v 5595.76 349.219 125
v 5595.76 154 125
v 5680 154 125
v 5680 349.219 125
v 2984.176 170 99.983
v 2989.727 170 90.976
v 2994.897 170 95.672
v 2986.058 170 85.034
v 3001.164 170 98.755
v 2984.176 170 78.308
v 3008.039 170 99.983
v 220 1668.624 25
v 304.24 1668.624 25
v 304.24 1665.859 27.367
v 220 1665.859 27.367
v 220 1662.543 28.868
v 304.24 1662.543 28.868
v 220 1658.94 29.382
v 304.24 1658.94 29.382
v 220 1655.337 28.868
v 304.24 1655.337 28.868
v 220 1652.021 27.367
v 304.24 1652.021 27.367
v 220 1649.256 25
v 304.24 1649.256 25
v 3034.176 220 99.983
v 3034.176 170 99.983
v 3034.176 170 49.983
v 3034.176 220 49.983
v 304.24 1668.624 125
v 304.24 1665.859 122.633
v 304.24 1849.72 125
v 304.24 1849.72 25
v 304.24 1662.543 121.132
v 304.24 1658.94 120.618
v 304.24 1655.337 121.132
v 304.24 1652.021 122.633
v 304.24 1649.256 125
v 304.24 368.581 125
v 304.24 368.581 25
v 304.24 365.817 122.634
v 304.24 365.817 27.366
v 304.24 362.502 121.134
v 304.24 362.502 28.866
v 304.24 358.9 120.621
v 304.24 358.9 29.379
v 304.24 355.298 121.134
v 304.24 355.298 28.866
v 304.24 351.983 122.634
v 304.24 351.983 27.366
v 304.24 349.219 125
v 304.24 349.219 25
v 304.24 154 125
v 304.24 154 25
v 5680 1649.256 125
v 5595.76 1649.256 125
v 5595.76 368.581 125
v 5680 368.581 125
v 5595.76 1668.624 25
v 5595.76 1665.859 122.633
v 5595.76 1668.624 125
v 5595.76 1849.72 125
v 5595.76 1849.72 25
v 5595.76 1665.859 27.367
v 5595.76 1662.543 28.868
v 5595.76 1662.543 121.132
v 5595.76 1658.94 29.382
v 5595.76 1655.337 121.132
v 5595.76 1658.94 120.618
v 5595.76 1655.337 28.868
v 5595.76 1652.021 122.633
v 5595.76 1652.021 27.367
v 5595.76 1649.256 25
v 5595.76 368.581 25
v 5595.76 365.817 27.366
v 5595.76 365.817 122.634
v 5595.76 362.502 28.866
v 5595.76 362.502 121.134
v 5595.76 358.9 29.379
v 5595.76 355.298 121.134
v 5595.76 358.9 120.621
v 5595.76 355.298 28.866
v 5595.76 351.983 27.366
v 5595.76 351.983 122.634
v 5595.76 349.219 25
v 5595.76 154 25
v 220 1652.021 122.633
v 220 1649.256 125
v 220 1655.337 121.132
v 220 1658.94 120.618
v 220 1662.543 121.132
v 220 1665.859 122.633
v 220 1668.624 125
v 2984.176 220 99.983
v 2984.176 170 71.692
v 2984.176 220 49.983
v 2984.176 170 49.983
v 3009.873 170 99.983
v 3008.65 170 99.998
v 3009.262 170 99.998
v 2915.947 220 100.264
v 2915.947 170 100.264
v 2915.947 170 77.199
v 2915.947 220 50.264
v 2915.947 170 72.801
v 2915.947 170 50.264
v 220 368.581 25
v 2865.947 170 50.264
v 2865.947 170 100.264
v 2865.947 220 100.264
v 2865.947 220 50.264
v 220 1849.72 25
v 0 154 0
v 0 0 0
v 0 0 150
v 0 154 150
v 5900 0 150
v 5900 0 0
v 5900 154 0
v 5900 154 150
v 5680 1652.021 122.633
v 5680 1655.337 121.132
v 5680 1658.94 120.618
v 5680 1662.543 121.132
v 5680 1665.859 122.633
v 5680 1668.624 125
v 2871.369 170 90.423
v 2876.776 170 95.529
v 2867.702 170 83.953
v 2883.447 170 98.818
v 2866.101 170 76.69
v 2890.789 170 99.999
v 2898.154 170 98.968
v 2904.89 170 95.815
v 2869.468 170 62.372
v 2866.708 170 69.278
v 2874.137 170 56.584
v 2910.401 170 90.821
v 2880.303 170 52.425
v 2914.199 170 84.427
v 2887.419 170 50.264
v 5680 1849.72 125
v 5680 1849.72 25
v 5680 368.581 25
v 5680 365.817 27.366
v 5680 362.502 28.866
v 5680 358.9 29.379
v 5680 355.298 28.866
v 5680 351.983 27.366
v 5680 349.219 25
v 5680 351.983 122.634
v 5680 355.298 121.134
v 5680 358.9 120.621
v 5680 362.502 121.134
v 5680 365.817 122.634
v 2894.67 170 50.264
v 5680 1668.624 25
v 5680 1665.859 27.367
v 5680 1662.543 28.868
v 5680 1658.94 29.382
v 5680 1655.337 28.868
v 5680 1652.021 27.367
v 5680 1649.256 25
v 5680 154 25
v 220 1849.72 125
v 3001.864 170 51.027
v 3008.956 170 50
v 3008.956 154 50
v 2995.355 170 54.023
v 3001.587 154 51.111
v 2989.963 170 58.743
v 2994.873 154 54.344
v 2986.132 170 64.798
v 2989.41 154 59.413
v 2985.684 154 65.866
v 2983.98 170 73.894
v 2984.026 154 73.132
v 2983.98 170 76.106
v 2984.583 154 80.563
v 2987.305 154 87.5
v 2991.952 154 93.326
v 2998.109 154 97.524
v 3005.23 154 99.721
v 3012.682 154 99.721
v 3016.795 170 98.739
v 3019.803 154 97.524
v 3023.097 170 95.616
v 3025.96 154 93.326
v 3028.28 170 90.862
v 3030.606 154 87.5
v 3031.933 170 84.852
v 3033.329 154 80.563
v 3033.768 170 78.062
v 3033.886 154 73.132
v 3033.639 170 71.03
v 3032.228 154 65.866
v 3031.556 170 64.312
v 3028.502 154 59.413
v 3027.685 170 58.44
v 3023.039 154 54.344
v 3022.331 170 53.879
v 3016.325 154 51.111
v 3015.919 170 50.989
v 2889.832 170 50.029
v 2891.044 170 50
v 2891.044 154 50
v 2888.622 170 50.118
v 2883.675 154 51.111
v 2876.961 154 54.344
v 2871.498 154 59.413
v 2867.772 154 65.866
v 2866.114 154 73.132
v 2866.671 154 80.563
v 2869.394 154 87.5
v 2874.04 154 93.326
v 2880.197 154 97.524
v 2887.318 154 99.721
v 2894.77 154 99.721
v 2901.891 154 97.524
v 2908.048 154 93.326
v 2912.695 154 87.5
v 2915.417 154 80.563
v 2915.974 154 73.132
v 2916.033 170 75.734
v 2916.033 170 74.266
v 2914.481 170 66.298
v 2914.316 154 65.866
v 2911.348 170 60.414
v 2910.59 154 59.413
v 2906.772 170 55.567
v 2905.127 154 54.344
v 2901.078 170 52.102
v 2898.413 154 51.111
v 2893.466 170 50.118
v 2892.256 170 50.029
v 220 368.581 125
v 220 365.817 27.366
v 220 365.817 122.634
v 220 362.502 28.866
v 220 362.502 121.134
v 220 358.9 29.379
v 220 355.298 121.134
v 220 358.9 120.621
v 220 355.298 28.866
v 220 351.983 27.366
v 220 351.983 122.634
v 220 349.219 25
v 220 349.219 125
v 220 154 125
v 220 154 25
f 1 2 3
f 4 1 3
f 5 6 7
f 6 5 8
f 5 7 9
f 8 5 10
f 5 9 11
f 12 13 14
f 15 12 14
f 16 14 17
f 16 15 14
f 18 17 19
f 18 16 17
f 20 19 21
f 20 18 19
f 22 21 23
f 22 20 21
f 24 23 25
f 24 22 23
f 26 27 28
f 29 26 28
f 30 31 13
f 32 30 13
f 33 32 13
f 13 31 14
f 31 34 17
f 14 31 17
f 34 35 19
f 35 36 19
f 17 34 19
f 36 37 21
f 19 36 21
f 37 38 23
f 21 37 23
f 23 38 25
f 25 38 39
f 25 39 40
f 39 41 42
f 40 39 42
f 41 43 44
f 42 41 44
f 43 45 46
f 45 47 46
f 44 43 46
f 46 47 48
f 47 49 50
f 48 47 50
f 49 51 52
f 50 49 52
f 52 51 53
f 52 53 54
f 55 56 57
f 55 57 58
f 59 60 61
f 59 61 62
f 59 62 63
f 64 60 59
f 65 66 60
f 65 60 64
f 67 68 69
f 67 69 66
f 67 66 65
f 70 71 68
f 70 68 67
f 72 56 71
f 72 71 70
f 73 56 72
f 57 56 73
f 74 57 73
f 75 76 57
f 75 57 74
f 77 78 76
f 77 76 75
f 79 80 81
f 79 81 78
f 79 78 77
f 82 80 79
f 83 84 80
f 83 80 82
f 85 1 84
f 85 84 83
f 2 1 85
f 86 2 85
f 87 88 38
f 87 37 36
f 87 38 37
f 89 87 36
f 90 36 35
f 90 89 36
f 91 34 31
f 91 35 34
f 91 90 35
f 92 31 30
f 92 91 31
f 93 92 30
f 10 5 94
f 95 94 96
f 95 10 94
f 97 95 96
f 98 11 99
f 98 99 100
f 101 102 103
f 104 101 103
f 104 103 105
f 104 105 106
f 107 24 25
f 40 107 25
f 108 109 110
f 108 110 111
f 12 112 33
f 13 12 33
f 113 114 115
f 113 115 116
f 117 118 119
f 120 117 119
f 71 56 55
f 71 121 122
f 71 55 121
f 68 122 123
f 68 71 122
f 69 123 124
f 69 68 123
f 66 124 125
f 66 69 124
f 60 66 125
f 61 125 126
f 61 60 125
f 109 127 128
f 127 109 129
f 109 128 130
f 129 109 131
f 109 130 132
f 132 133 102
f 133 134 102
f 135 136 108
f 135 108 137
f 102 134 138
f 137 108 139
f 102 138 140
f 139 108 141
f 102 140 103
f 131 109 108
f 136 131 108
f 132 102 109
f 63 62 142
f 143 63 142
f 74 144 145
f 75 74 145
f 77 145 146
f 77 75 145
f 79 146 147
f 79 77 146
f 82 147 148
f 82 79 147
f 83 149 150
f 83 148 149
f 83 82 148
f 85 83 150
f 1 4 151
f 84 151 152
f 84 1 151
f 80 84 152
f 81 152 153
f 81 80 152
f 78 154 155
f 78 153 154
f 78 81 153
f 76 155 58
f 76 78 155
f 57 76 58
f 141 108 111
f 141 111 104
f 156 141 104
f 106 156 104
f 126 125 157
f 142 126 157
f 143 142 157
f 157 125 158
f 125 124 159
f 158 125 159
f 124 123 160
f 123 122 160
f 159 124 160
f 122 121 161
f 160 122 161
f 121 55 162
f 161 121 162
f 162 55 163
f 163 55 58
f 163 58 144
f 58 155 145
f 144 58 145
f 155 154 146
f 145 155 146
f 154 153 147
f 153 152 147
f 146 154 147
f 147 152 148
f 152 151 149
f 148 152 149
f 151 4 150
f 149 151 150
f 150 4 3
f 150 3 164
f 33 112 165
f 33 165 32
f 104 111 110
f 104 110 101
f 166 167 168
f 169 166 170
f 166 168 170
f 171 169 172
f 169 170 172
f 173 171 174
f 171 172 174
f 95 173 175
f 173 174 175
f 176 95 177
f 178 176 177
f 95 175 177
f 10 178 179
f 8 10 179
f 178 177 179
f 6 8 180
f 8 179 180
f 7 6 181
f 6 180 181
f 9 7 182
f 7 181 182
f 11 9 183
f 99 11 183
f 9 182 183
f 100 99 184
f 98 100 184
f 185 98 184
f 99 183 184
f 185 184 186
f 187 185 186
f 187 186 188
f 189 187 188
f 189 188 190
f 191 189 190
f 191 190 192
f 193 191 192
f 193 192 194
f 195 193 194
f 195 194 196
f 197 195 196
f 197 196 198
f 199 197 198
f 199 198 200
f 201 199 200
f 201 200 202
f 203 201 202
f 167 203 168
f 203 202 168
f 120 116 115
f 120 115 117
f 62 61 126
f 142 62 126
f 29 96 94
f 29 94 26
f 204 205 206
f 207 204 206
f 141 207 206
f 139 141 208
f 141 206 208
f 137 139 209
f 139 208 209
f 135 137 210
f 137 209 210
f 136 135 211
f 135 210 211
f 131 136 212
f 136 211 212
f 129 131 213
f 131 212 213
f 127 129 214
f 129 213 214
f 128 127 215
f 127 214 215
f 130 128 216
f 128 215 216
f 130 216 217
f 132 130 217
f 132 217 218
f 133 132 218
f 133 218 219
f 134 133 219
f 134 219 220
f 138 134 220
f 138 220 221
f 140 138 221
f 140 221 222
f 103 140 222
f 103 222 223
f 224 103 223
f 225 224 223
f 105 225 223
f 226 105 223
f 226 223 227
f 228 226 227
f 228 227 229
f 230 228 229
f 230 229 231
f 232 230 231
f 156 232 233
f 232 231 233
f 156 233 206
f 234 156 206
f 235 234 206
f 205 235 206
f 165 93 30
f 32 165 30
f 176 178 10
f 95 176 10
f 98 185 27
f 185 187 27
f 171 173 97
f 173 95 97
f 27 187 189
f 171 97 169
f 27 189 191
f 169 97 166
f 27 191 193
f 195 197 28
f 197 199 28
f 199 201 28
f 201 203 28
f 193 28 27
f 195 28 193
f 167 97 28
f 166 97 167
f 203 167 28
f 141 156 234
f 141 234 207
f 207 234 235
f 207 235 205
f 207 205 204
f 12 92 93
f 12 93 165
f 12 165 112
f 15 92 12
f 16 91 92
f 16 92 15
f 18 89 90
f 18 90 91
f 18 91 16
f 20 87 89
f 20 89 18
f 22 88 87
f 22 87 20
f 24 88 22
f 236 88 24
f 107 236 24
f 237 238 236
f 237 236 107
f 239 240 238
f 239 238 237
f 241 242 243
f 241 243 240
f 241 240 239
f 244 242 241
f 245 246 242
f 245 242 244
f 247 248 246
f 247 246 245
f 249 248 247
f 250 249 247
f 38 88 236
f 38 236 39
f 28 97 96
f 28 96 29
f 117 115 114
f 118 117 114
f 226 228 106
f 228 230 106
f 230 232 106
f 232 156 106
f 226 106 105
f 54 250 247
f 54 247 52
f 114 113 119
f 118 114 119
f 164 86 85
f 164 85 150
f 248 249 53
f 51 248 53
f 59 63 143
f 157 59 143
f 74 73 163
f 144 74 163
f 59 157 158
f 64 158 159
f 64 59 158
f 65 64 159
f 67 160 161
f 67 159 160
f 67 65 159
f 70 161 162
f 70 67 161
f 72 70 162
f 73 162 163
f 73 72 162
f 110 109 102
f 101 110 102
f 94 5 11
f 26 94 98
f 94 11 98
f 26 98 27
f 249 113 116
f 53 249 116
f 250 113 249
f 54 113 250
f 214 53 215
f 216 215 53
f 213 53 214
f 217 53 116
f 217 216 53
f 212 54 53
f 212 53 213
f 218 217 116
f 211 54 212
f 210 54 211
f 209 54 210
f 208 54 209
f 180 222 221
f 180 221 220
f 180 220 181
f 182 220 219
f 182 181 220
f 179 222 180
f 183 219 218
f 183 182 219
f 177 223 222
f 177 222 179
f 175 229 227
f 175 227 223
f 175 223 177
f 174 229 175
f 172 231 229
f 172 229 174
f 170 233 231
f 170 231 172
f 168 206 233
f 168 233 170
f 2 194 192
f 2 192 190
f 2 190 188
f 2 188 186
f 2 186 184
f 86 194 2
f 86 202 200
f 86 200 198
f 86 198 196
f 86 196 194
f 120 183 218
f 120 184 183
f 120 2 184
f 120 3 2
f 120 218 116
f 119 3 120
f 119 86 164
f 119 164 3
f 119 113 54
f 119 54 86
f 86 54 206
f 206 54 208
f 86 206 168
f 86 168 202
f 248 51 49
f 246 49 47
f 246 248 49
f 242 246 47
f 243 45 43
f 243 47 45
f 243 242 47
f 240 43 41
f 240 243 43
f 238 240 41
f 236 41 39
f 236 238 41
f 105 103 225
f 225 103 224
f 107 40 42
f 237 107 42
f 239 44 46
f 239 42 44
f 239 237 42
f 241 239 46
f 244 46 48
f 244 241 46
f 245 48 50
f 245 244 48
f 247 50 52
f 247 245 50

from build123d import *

# Parameters (mm, degrees)
ESBO_O1_W                = 5900
ESBO_O1_H                = 154
RESSALTO_EXTRUS_O1_DEPTH = 150
ESBO_O3_W                = 84.24
ESBO_O3_H                = 100
RESSALTO_EXTRUS_O2_DEPTH = 1849.72
ESBO_O4_R                = 12.892389556
ESBO_O4_R_2              = 12.89
CORTE_EXTRUS_O2_DEPTH    = 6185.978906868
ESBO_O5_R                = 25
RESSALTO_EXTRUS_O3_DEPTH = 170
ESBO_O7_W                = 50
ESBO_O7_H                = 50
RESSALTO_EXTRUS_O4_DEPTH = 50


with BuildPart() as part:
    # Esboço1 → Ressalto-extrusão1 (new body)
    with BuildSketch(Plane.XY):
        with Locations((2950, 77)):
            Rectangle(ESBO_O1_W, ESBO_O1_H)
    extrude(amount=RESSALTO_EXTRUS_O1_DEPTH)

    # Esboço3 → Ressalto-extrusão2 (add)
    with BuildSketch(Plane(origin=(0, 0, 0), x_dir=(1, 0, 0), z_dir=(0, 1, 0))):
        with Locations((5637.88, -75)):
            Rectangle(ESBO_O3_W, ESBO_O3_H)
        with Locations((262.12, -75)):
            Rectangle(ESBO_O3_W, ESBO_O3_H)
    extrude(amount=RESSALTO_EXTRUS_O2_DEPTH)

    # Esboço4 → Corte-extrusão2 (cut, through all)
    with BuildSketch(Plane(origin=(0, 0, 0), x_dir=(0, 0, -1), z_dir=(1, 0, 0))):
        with Locations((-16.489271988, 1658.94)):
            Circle(ESBO_O4_R)
        with Locations((-133.510728012, 1658.94)):
            Circle(ESBO_O4_R)
        with Locations((-16.489271988, 358.9)):
            Circle(ESBO_O4_R_2)
        with Locations((-133.510728012, 358.9)):
            Circle(ESBO_O4_R_2)
    extrude(amount=CORTE_EXTRUS_O2_DEPTH, mode=Mode.SUBTRACT)

    # Esboço5 → Ressalto-extrusão3 (add)
    with BuildSketch(Plane(origin=(0, 0, 0), x_dir=(1, 0, 0), z_dir=(0, 1, 0))):
        with Locations(Location((3008.955824922, -75, 0), (0, 0, 90))):
            Circle(ESBO_O5_R)
        with Locations(Location((2891.044175078, -75, 0), (0, 0, 90))):
            Circle(ESBO_O5_R)
    extrude(amount=RESSALTO_EXTRUS_O3_DEPTH)

    # Esboço7 → Ressalto-extrusão4 (add)
    with BuildSketch(Plane(origin=(0, 170, 0), x_dir=(1, 0, 0), z_dir=(0, 1, 0))):
        with Locations((3009.175695641, -74.98317061)):
            Rectangle(ESBO_O7_W, ESBO_O7_H)
        with Locations((2890.947304084, -75.264284294)):
            Rectangle(ESBO_O7_W, ESBO_O7_H)
    extrude(amount=RESSALTO_EXTRUS_O4_DEPTH)


solid = part.part
